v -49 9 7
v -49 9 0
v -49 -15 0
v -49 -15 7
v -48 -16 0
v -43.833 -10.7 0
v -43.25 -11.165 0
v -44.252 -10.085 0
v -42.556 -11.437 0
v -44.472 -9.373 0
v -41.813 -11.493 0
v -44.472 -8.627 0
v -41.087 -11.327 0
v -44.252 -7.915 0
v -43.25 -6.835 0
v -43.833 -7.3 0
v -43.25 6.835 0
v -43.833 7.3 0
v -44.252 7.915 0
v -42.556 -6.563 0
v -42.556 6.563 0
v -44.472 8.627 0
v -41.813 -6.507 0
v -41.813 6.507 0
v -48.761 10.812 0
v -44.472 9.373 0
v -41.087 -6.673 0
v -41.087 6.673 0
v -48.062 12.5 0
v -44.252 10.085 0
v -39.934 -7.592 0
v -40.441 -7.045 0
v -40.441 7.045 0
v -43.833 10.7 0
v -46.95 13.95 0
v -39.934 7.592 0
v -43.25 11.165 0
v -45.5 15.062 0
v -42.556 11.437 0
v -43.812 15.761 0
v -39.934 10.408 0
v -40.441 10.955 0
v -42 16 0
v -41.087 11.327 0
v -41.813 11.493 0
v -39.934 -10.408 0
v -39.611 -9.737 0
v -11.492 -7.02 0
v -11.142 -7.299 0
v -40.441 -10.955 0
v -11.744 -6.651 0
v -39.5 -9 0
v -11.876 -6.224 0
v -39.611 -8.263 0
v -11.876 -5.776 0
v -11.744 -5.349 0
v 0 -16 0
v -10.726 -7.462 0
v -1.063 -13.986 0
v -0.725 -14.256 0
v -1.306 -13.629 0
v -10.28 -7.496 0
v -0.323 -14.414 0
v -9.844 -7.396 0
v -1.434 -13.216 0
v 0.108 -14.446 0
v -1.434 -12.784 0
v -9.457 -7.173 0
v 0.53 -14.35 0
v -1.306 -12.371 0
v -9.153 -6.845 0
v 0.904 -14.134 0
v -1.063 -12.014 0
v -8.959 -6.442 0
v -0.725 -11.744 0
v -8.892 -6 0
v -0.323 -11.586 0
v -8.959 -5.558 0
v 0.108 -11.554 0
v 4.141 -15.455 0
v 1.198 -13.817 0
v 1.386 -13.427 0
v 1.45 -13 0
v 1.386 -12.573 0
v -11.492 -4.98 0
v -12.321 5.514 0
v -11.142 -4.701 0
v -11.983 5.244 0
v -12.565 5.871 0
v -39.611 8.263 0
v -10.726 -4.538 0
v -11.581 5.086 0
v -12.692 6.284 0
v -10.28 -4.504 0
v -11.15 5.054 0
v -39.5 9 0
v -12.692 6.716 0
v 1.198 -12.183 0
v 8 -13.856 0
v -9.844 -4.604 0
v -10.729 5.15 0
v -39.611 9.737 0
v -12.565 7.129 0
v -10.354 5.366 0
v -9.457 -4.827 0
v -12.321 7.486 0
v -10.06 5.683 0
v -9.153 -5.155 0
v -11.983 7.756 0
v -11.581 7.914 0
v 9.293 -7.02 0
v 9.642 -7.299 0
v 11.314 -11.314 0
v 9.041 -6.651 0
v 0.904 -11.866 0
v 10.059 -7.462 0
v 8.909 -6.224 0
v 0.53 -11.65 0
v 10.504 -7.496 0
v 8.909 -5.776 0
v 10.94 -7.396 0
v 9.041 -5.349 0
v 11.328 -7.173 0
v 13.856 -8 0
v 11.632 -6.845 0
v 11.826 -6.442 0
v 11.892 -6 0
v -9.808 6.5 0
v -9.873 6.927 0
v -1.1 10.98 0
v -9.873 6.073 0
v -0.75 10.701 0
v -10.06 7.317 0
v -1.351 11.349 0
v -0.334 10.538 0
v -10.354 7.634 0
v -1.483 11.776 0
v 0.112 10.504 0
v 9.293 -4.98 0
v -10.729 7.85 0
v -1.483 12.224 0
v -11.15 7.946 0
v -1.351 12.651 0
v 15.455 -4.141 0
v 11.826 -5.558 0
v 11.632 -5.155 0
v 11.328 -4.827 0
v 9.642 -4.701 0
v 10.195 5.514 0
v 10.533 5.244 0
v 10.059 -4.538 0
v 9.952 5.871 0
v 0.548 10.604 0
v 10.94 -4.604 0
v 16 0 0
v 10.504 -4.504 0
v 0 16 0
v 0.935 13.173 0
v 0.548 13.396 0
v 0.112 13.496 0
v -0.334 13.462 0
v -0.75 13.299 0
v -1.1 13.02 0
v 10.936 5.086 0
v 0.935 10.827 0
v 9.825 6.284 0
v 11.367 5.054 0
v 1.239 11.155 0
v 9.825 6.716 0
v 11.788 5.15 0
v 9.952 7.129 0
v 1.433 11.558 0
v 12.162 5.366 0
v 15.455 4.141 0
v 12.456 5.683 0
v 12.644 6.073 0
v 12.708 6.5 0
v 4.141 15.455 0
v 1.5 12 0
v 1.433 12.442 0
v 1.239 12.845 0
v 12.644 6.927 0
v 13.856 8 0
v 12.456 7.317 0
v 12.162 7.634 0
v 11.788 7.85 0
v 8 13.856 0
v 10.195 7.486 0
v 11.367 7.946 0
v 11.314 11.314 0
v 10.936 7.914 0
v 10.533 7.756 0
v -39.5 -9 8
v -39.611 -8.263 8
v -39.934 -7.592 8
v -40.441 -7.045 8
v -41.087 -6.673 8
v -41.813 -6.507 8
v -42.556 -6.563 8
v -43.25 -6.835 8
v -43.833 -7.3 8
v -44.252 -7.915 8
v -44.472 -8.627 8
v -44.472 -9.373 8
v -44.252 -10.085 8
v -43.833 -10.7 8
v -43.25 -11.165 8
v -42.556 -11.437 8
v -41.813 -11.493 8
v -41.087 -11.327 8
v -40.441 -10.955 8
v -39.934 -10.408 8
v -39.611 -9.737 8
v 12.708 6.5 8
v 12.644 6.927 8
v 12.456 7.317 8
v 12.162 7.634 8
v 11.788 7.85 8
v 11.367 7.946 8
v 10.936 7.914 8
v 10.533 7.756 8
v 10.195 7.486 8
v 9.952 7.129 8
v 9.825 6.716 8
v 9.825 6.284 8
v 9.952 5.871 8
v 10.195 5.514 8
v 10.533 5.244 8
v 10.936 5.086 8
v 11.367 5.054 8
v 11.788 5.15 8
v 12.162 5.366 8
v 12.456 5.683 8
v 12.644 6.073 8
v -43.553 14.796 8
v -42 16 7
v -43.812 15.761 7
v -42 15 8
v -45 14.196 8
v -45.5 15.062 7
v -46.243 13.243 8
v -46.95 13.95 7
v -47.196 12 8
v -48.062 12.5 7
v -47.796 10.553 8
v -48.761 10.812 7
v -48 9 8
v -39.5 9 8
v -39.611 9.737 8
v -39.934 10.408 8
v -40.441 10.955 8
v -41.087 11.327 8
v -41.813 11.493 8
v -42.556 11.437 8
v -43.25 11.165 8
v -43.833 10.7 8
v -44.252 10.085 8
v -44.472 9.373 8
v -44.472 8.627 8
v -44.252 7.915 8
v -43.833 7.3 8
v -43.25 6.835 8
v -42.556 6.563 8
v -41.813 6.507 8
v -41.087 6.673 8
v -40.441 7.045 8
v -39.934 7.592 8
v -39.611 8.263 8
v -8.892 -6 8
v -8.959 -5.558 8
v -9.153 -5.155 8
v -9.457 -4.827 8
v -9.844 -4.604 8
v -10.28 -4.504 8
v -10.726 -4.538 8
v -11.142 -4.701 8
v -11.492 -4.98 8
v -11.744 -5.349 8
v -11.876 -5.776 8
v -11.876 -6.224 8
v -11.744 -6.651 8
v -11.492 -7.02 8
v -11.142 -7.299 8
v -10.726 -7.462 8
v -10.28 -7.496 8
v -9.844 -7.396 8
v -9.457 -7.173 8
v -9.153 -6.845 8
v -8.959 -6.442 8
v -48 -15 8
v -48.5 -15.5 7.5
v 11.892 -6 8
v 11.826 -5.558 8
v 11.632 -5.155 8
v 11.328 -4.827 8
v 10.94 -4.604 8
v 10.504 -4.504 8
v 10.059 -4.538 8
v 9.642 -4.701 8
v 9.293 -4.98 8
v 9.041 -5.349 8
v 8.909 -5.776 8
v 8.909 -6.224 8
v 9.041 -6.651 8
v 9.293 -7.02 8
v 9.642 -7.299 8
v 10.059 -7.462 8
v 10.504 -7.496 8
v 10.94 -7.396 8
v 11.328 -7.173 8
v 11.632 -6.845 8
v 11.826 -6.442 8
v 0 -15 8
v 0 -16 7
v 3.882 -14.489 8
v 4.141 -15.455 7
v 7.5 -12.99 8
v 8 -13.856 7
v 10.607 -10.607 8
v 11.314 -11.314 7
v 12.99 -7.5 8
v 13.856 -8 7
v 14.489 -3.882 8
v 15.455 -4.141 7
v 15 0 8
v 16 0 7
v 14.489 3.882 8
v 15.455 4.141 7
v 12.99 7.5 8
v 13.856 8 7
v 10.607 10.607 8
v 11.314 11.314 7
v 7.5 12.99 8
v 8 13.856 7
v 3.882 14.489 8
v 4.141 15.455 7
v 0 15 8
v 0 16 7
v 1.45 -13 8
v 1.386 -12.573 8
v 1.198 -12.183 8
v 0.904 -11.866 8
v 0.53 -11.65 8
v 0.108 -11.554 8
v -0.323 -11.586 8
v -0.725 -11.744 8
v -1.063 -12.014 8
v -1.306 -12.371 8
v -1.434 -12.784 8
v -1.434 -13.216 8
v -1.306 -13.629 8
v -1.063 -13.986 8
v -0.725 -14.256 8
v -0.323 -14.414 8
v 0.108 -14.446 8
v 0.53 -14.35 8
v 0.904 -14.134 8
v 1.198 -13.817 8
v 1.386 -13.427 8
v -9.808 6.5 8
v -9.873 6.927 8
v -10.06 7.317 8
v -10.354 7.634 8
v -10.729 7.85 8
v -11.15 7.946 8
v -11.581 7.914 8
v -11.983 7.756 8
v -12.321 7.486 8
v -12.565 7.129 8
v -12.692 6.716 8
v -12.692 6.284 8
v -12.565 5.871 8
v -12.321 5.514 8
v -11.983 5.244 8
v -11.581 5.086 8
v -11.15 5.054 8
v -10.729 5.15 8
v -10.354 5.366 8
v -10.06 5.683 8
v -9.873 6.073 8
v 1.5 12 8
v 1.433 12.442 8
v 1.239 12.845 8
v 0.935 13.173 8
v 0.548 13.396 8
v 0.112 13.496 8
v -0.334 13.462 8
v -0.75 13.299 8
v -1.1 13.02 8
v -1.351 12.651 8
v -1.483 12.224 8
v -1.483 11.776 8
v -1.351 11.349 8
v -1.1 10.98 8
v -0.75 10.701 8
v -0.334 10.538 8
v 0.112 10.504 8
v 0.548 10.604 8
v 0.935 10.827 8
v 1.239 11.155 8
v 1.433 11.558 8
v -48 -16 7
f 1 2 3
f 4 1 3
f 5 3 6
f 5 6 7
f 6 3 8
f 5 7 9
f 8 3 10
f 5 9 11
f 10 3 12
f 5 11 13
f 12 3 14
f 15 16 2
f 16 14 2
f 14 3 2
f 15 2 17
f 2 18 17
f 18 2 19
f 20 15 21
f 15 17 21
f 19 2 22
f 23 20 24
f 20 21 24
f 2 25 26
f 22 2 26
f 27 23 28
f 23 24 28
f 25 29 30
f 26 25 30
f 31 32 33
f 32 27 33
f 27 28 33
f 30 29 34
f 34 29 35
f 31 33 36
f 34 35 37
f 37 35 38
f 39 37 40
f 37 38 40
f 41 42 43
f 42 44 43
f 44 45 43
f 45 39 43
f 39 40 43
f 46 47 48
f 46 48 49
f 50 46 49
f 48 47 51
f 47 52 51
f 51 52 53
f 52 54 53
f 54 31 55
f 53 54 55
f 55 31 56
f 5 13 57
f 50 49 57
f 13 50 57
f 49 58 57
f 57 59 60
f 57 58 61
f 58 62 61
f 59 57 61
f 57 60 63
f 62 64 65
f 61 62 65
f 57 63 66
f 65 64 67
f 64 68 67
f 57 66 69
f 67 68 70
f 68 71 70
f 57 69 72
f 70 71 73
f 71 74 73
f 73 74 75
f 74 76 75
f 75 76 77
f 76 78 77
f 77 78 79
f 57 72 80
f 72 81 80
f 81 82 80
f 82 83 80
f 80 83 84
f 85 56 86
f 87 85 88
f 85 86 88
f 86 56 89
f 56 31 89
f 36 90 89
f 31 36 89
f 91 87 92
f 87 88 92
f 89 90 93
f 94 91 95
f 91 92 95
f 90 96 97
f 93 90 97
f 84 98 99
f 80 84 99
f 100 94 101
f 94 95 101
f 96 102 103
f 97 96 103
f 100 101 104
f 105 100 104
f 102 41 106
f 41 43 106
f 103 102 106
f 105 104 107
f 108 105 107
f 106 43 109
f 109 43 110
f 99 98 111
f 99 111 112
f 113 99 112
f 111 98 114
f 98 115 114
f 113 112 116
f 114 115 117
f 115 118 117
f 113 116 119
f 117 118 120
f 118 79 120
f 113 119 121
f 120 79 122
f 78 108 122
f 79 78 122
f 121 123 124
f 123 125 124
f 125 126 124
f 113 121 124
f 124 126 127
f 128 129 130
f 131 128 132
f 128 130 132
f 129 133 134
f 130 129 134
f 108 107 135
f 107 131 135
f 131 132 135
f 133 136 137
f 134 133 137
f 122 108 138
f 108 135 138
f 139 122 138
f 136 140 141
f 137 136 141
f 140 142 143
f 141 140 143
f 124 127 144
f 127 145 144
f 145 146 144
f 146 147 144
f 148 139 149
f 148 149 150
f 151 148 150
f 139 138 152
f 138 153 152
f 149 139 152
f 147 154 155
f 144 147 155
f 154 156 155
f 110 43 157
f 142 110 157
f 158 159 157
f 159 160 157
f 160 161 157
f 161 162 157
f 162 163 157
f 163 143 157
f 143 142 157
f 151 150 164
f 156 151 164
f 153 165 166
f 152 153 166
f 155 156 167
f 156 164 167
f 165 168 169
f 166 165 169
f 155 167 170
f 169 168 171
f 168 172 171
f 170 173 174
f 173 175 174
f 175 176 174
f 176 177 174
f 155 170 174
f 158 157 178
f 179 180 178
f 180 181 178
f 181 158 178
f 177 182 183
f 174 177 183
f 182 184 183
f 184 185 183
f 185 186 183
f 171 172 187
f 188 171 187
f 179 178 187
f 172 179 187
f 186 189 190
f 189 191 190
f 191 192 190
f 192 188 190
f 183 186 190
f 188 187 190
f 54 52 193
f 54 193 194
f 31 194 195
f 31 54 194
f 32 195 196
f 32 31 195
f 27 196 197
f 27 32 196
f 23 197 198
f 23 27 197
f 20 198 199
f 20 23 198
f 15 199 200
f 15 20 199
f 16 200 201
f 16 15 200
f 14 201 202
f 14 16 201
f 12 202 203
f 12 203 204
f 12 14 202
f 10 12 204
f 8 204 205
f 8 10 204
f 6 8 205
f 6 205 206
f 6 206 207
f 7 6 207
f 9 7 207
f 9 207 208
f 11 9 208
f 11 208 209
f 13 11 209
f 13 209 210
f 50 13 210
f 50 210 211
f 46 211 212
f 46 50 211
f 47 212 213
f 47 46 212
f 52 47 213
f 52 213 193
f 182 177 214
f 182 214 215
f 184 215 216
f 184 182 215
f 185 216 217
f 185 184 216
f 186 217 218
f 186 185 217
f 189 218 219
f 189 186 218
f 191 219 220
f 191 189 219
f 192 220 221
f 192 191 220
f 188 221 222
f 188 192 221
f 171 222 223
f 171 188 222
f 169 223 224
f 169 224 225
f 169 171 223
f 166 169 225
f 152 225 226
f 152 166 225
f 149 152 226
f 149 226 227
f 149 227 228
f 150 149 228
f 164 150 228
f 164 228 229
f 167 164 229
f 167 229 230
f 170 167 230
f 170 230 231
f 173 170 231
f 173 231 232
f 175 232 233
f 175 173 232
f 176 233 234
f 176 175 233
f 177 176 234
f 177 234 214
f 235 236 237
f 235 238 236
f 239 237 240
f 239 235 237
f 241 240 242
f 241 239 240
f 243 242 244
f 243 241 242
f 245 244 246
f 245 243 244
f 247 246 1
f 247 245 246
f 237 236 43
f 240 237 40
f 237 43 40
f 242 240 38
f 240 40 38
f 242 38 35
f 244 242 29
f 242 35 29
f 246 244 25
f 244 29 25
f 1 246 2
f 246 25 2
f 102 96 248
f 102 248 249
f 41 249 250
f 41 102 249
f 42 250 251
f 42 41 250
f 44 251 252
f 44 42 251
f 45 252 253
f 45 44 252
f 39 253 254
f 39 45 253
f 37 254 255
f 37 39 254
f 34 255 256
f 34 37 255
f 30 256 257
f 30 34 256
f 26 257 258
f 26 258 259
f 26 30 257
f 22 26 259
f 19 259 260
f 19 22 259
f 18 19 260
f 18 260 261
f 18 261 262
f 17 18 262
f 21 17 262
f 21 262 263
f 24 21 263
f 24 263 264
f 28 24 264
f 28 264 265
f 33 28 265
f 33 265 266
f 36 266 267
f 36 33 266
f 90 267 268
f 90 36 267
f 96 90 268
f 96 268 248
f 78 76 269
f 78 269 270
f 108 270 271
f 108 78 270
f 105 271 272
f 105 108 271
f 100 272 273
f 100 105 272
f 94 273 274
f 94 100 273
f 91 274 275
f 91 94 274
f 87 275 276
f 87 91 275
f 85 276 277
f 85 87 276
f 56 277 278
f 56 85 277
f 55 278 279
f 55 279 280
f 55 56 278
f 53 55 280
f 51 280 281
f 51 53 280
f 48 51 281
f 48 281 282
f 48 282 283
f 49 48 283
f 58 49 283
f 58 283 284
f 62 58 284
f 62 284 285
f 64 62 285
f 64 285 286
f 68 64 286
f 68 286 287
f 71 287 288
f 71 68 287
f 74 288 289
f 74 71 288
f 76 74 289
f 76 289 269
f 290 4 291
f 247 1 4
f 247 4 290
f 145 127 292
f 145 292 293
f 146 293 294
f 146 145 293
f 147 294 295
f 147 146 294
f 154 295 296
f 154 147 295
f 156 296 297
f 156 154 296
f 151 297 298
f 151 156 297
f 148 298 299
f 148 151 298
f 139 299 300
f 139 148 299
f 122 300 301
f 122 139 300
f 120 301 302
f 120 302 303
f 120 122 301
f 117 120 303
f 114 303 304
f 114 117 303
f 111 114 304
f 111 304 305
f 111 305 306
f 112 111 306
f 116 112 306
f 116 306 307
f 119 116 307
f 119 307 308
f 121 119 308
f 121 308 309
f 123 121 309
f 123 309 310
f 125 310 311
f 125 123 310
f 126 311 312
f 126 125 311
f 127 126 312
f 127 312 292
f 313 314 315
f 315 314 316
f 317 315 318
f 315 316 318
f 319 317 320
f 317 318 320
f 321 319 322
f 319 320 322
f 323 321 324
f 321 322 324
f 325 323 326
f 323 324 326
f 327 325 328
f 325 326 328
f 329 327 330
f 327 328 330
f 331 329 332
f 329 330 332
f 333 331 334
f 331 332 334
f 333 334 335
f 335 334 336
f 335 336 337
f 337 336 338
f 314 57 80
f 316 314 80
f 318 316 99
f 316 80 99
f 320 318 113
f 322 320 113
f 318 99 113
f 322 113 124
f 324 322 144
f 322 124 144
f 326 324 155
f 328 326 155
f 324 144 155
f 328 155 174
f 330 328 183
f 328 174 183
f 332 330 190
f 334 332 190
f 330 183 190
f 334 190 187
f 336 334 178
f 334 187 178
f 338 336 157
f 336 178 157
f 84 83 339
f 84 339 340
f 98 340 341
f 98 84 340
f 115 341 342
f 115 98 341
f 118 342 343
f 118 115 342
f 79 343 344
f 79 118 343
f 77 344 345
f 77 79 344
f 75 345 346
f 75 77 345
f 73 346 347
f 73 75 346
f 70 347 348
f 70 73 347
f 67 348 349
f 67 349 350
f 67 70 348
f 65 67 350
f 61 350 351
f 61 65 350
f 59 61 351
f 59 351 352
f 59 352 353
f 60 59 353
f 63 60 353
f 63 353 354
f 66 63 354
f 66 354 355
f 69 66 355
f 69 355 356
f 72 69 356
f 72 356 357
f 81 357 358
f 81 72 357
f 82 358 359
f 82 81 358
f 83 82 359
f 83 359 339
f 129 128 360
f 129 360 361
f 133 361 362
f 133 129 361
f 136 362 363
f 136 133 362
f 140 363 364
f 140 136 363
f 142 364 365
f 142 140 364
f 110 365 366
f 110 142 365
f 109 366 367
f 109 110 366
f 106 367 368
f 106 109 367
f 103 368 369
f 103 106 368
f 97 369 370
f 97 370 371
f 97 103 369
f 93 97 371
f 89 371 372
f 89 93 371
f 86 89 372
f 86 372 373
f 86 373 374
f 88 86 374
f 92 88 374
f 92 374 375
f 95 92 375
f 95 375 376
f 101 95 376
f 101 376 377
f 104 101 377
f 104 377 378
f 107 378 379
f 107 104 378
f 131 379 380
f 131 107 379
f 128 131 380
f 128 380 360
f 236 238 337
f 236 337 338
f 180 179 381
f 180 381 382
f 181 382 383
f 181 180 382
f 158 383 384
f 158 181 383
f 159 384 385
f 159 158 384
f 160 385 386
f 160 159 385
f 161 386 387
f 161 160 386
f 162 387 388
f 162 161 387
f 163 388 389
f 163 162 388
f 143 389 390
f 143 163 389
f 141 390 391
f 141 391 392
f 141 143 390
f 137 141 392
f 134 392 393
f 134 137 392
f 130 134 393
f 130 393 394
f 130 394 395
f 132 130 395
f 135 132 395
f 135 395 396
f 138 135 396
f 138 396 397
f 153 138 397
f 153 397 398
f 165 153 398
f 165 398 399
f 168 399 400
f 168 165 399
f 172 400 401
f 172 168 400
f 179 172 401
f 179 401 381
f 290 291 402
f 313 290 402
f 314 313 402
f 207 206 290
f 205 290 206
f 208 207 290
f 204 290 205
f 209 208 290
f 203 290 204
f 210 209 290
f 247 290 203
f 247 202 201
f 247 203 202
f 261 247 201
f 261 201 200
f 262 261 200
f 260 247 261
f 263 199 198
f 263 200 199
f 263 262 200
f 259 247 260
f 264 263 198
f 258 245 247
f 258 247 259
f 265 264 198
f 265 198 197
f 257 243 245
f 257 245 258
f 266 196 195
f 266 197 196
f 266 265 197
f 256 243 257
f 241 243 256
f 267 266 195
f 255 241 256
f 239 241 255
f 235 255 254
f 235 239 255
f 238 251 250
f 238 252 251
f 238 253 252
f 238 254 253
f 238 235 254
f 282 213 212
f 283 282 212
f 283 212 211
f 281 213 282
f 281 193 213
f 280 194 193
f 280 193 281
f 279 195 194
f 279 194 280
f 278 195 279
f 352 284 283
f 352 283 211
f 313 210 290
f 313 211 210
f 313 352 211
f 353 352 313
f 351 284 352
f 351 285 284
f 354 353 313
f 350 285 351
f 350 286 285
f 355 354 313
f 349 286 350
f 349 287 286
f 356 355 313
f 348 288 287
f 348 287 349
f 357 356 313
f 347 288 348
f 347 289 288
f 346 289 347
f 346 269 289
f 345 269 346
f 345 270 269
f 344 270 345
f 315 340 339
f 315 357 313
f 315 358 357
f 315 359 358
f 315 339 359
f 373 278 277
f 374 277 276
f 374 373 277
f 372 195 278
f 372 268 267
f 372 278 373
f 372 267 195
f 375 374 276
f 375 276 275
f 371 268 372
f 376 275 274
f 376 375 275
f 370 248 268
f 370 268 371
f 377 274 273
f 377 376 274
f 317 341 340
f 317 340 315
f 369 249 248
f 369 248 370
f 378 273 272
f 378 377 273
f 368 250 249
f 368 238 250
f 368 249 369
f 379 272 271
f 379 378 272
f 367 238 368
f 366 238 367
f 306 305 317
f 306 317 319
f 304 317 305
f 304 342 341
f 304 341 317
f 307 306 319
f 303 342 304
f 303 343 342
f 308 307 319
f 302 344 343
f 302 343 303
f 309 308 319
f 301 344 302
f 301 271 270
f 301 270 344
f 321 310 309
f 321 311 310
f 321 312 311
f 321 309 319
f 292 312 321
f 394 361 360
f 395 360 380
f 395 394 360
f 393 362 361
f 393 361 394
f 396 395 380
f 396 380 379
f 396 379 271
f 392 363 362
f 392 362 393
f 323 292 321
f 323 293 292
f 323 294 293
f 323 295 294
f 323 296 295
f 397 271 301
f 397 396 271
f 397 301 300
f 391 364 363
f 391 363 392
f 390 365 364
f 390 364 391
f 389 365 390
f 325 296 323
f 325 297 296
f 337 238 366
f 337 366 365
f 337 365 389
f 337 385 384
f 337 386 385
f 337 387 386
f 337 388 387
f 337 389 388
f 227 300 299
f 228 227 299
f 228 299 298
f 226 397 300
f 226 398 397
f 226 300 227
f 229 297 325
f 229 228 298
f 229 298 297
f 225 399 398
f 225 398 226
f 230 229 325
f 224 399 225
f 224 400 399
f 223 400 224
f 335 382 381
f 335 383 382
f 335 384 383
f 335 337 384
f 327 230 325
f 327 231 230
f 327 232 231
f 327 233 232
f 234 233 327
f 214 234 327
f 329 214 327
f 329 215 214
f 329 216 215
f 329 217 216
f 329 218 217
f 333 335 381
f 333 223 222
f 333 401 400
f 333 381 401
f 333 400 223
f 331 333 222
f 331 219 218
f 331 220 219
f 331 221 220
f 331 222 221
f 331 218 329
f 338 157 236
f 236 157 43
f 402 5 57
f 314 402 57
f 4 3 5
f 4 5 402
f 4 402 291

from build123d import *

# Parameters (mm, degrees)
SKETCH_1_R      = 1.45
SKETCH_1_R_2    = 1.5
SKETCH_1_R_3    = 2.5
EXTRUDE_1_DEPTH = 8
CHAMFER_1_SIZE  = 1
CHAMFER_2_SIZE  = 1


with BuildPart() as part:
    # 草图1 → 凸台-拉伸1 (new body)
    with BuildSketch(Plane.XY):
        with BuildLine():
            Line((0, 16), (-42, 16))
            ThreePointArc((-42, 16), (-46.949747468, 13.949747468), (-49, 9))
            Line((-49, 9), (-49, -16))
            Line((-49, -16), (0, -16))
            ThreePointArc((0, -16), (16, 0), (0, 16))
        make_face()
        with Locations((0, -13)):
            Circle(SKETCH_1_R, mode=Mode.SUBTRACT)
        with Locations((10.392304845, -6)):
            Circle(SKETCH_1_R_2, mode=Mode.SUBTRACT)
        with Locations((11.258330249, 6.5)):
            Circle(SKETCH_1_R, mode=Mode.SUBTRACT)
        with Locations((-10.392304845, -6)):
            Circle(SKETCH_1_R_2, mode=Mode.SUBTRACT)
        with Locations((-11.258330249, 6.5)):
            Circle(SKETCH_1_R, mode=Mode.SUBTRACT)
        with Locations((0, 12)):
            Circle(SKETCH_1_R_2, mode=Mode.SUBTRACT)
        with Locations((-42, 9)):
            Circle(SKETCH_1_R_3, mode=Mode.SUBTRACT)
        with Locations((-42, -9)):
            Circle(SKETCH_1_R_3, mode=Mode.SUBTRACT)
    extrude(amount=EXTRUDE_1_DEPTH)

    # 倒角1
    chamfer_1_edges = [part.edges().sort_by_distance(p)[0] for p in [
        (-49, -16, 4),
    ]]
    chamfer(chamfer_1_edges, length=CHAMFER_1_SIZE)

    # 倒角2
    # the kernel refuses this chamfer: 1 mm, written as the material it takes off along each edge
    with BuildSketch(Plane(origin=(-50.571682988, -16, 8), x_dir=(0, 0.9996219169112968, 0.027495876610585647), z_dir=(1, 0, 0))) as chamfer_2_piece_1:
        Polygon((CHAMFER_2_SIZE * 0.999621916911, -CHAMFER_2_SIZE * 0.0274958766106), (-CHAMFER_2_SIZE * 0.0274958766106, -CHAMFER_2_SIZE * 0.999621916911), (0, 0), align=None)
    extrude(amount=50.571682988, mode=Mode.SUBTRACT)
    with BuildSketch(Plane(origin=(-49, 9, 8), x_dir=(-0.02749587661058907, 0, -0.9996219169112965), z_dir=(0, -1, 0))) as chamfer_2_piece_2:
        Polygon((CHAMFER_2_SIZE * 0.999621916911, CHAMFER_2_SIZE * 0.0274958766106), (-CHAMFER_2_SIZE * 0.0274958766106, CHAMFER_2_SIZE * 0.999621916911), (0, 0), align=None)
    extrude(amount=26.571682988, mode=Mode.SUBTRACT)
    with BuildSketch(Plane(origin=(0, 0, 8), x_dir=(0, -1, 0), z_dir=(-1, 0, 0))) as chamfer_2_piece_3:
        Polygon((16 - CHAMFER_2_SIZE, 0), (16, -CHAMFER_2_SIZE), (16, 0), align=None)
    revolve(axis=Axis((0, 0, 8), (0, 0, 1)), revolution_arc=180, mode=Mode.SUBTRACT)
    with BuildSketch(Plane(origin=(-42, 9, 8), x_dir=(0, 1, 0), z_dir=(1, 0, 0))) as chamfer_2_piece_4:
        Polygon((7, -CHAMFER_2_SIZE), (7 - CHAMFER_2_SIZE, 0), (7, 0), align=None)
    revolve(axis=Axis((-42, 9, 8), (0, 0, 1)), revolution_arc=90, mode=Mode.SUBTRACT)
    with BuildSketch(Plane(origin=(0, 16, 8), x_dir=(0, -0.9996219169112968, 0.027495876610585647), z_dir=(-1, 0, 0))) as chamfer_2_piece_5:
        Polygon((CHAMFER_2_SIZE * 0.999621916911, -CHAMFER_2_SIZE * 0.0274958766106), (-CHAMFER_2_SIZE * 0.0274958766106, -CHAMFER_2_SIZE * 0.999621916911), (0, 0), align=None)
    extrude(amount=42, mode=Mode.SUBTRACT)


solid = part.part
